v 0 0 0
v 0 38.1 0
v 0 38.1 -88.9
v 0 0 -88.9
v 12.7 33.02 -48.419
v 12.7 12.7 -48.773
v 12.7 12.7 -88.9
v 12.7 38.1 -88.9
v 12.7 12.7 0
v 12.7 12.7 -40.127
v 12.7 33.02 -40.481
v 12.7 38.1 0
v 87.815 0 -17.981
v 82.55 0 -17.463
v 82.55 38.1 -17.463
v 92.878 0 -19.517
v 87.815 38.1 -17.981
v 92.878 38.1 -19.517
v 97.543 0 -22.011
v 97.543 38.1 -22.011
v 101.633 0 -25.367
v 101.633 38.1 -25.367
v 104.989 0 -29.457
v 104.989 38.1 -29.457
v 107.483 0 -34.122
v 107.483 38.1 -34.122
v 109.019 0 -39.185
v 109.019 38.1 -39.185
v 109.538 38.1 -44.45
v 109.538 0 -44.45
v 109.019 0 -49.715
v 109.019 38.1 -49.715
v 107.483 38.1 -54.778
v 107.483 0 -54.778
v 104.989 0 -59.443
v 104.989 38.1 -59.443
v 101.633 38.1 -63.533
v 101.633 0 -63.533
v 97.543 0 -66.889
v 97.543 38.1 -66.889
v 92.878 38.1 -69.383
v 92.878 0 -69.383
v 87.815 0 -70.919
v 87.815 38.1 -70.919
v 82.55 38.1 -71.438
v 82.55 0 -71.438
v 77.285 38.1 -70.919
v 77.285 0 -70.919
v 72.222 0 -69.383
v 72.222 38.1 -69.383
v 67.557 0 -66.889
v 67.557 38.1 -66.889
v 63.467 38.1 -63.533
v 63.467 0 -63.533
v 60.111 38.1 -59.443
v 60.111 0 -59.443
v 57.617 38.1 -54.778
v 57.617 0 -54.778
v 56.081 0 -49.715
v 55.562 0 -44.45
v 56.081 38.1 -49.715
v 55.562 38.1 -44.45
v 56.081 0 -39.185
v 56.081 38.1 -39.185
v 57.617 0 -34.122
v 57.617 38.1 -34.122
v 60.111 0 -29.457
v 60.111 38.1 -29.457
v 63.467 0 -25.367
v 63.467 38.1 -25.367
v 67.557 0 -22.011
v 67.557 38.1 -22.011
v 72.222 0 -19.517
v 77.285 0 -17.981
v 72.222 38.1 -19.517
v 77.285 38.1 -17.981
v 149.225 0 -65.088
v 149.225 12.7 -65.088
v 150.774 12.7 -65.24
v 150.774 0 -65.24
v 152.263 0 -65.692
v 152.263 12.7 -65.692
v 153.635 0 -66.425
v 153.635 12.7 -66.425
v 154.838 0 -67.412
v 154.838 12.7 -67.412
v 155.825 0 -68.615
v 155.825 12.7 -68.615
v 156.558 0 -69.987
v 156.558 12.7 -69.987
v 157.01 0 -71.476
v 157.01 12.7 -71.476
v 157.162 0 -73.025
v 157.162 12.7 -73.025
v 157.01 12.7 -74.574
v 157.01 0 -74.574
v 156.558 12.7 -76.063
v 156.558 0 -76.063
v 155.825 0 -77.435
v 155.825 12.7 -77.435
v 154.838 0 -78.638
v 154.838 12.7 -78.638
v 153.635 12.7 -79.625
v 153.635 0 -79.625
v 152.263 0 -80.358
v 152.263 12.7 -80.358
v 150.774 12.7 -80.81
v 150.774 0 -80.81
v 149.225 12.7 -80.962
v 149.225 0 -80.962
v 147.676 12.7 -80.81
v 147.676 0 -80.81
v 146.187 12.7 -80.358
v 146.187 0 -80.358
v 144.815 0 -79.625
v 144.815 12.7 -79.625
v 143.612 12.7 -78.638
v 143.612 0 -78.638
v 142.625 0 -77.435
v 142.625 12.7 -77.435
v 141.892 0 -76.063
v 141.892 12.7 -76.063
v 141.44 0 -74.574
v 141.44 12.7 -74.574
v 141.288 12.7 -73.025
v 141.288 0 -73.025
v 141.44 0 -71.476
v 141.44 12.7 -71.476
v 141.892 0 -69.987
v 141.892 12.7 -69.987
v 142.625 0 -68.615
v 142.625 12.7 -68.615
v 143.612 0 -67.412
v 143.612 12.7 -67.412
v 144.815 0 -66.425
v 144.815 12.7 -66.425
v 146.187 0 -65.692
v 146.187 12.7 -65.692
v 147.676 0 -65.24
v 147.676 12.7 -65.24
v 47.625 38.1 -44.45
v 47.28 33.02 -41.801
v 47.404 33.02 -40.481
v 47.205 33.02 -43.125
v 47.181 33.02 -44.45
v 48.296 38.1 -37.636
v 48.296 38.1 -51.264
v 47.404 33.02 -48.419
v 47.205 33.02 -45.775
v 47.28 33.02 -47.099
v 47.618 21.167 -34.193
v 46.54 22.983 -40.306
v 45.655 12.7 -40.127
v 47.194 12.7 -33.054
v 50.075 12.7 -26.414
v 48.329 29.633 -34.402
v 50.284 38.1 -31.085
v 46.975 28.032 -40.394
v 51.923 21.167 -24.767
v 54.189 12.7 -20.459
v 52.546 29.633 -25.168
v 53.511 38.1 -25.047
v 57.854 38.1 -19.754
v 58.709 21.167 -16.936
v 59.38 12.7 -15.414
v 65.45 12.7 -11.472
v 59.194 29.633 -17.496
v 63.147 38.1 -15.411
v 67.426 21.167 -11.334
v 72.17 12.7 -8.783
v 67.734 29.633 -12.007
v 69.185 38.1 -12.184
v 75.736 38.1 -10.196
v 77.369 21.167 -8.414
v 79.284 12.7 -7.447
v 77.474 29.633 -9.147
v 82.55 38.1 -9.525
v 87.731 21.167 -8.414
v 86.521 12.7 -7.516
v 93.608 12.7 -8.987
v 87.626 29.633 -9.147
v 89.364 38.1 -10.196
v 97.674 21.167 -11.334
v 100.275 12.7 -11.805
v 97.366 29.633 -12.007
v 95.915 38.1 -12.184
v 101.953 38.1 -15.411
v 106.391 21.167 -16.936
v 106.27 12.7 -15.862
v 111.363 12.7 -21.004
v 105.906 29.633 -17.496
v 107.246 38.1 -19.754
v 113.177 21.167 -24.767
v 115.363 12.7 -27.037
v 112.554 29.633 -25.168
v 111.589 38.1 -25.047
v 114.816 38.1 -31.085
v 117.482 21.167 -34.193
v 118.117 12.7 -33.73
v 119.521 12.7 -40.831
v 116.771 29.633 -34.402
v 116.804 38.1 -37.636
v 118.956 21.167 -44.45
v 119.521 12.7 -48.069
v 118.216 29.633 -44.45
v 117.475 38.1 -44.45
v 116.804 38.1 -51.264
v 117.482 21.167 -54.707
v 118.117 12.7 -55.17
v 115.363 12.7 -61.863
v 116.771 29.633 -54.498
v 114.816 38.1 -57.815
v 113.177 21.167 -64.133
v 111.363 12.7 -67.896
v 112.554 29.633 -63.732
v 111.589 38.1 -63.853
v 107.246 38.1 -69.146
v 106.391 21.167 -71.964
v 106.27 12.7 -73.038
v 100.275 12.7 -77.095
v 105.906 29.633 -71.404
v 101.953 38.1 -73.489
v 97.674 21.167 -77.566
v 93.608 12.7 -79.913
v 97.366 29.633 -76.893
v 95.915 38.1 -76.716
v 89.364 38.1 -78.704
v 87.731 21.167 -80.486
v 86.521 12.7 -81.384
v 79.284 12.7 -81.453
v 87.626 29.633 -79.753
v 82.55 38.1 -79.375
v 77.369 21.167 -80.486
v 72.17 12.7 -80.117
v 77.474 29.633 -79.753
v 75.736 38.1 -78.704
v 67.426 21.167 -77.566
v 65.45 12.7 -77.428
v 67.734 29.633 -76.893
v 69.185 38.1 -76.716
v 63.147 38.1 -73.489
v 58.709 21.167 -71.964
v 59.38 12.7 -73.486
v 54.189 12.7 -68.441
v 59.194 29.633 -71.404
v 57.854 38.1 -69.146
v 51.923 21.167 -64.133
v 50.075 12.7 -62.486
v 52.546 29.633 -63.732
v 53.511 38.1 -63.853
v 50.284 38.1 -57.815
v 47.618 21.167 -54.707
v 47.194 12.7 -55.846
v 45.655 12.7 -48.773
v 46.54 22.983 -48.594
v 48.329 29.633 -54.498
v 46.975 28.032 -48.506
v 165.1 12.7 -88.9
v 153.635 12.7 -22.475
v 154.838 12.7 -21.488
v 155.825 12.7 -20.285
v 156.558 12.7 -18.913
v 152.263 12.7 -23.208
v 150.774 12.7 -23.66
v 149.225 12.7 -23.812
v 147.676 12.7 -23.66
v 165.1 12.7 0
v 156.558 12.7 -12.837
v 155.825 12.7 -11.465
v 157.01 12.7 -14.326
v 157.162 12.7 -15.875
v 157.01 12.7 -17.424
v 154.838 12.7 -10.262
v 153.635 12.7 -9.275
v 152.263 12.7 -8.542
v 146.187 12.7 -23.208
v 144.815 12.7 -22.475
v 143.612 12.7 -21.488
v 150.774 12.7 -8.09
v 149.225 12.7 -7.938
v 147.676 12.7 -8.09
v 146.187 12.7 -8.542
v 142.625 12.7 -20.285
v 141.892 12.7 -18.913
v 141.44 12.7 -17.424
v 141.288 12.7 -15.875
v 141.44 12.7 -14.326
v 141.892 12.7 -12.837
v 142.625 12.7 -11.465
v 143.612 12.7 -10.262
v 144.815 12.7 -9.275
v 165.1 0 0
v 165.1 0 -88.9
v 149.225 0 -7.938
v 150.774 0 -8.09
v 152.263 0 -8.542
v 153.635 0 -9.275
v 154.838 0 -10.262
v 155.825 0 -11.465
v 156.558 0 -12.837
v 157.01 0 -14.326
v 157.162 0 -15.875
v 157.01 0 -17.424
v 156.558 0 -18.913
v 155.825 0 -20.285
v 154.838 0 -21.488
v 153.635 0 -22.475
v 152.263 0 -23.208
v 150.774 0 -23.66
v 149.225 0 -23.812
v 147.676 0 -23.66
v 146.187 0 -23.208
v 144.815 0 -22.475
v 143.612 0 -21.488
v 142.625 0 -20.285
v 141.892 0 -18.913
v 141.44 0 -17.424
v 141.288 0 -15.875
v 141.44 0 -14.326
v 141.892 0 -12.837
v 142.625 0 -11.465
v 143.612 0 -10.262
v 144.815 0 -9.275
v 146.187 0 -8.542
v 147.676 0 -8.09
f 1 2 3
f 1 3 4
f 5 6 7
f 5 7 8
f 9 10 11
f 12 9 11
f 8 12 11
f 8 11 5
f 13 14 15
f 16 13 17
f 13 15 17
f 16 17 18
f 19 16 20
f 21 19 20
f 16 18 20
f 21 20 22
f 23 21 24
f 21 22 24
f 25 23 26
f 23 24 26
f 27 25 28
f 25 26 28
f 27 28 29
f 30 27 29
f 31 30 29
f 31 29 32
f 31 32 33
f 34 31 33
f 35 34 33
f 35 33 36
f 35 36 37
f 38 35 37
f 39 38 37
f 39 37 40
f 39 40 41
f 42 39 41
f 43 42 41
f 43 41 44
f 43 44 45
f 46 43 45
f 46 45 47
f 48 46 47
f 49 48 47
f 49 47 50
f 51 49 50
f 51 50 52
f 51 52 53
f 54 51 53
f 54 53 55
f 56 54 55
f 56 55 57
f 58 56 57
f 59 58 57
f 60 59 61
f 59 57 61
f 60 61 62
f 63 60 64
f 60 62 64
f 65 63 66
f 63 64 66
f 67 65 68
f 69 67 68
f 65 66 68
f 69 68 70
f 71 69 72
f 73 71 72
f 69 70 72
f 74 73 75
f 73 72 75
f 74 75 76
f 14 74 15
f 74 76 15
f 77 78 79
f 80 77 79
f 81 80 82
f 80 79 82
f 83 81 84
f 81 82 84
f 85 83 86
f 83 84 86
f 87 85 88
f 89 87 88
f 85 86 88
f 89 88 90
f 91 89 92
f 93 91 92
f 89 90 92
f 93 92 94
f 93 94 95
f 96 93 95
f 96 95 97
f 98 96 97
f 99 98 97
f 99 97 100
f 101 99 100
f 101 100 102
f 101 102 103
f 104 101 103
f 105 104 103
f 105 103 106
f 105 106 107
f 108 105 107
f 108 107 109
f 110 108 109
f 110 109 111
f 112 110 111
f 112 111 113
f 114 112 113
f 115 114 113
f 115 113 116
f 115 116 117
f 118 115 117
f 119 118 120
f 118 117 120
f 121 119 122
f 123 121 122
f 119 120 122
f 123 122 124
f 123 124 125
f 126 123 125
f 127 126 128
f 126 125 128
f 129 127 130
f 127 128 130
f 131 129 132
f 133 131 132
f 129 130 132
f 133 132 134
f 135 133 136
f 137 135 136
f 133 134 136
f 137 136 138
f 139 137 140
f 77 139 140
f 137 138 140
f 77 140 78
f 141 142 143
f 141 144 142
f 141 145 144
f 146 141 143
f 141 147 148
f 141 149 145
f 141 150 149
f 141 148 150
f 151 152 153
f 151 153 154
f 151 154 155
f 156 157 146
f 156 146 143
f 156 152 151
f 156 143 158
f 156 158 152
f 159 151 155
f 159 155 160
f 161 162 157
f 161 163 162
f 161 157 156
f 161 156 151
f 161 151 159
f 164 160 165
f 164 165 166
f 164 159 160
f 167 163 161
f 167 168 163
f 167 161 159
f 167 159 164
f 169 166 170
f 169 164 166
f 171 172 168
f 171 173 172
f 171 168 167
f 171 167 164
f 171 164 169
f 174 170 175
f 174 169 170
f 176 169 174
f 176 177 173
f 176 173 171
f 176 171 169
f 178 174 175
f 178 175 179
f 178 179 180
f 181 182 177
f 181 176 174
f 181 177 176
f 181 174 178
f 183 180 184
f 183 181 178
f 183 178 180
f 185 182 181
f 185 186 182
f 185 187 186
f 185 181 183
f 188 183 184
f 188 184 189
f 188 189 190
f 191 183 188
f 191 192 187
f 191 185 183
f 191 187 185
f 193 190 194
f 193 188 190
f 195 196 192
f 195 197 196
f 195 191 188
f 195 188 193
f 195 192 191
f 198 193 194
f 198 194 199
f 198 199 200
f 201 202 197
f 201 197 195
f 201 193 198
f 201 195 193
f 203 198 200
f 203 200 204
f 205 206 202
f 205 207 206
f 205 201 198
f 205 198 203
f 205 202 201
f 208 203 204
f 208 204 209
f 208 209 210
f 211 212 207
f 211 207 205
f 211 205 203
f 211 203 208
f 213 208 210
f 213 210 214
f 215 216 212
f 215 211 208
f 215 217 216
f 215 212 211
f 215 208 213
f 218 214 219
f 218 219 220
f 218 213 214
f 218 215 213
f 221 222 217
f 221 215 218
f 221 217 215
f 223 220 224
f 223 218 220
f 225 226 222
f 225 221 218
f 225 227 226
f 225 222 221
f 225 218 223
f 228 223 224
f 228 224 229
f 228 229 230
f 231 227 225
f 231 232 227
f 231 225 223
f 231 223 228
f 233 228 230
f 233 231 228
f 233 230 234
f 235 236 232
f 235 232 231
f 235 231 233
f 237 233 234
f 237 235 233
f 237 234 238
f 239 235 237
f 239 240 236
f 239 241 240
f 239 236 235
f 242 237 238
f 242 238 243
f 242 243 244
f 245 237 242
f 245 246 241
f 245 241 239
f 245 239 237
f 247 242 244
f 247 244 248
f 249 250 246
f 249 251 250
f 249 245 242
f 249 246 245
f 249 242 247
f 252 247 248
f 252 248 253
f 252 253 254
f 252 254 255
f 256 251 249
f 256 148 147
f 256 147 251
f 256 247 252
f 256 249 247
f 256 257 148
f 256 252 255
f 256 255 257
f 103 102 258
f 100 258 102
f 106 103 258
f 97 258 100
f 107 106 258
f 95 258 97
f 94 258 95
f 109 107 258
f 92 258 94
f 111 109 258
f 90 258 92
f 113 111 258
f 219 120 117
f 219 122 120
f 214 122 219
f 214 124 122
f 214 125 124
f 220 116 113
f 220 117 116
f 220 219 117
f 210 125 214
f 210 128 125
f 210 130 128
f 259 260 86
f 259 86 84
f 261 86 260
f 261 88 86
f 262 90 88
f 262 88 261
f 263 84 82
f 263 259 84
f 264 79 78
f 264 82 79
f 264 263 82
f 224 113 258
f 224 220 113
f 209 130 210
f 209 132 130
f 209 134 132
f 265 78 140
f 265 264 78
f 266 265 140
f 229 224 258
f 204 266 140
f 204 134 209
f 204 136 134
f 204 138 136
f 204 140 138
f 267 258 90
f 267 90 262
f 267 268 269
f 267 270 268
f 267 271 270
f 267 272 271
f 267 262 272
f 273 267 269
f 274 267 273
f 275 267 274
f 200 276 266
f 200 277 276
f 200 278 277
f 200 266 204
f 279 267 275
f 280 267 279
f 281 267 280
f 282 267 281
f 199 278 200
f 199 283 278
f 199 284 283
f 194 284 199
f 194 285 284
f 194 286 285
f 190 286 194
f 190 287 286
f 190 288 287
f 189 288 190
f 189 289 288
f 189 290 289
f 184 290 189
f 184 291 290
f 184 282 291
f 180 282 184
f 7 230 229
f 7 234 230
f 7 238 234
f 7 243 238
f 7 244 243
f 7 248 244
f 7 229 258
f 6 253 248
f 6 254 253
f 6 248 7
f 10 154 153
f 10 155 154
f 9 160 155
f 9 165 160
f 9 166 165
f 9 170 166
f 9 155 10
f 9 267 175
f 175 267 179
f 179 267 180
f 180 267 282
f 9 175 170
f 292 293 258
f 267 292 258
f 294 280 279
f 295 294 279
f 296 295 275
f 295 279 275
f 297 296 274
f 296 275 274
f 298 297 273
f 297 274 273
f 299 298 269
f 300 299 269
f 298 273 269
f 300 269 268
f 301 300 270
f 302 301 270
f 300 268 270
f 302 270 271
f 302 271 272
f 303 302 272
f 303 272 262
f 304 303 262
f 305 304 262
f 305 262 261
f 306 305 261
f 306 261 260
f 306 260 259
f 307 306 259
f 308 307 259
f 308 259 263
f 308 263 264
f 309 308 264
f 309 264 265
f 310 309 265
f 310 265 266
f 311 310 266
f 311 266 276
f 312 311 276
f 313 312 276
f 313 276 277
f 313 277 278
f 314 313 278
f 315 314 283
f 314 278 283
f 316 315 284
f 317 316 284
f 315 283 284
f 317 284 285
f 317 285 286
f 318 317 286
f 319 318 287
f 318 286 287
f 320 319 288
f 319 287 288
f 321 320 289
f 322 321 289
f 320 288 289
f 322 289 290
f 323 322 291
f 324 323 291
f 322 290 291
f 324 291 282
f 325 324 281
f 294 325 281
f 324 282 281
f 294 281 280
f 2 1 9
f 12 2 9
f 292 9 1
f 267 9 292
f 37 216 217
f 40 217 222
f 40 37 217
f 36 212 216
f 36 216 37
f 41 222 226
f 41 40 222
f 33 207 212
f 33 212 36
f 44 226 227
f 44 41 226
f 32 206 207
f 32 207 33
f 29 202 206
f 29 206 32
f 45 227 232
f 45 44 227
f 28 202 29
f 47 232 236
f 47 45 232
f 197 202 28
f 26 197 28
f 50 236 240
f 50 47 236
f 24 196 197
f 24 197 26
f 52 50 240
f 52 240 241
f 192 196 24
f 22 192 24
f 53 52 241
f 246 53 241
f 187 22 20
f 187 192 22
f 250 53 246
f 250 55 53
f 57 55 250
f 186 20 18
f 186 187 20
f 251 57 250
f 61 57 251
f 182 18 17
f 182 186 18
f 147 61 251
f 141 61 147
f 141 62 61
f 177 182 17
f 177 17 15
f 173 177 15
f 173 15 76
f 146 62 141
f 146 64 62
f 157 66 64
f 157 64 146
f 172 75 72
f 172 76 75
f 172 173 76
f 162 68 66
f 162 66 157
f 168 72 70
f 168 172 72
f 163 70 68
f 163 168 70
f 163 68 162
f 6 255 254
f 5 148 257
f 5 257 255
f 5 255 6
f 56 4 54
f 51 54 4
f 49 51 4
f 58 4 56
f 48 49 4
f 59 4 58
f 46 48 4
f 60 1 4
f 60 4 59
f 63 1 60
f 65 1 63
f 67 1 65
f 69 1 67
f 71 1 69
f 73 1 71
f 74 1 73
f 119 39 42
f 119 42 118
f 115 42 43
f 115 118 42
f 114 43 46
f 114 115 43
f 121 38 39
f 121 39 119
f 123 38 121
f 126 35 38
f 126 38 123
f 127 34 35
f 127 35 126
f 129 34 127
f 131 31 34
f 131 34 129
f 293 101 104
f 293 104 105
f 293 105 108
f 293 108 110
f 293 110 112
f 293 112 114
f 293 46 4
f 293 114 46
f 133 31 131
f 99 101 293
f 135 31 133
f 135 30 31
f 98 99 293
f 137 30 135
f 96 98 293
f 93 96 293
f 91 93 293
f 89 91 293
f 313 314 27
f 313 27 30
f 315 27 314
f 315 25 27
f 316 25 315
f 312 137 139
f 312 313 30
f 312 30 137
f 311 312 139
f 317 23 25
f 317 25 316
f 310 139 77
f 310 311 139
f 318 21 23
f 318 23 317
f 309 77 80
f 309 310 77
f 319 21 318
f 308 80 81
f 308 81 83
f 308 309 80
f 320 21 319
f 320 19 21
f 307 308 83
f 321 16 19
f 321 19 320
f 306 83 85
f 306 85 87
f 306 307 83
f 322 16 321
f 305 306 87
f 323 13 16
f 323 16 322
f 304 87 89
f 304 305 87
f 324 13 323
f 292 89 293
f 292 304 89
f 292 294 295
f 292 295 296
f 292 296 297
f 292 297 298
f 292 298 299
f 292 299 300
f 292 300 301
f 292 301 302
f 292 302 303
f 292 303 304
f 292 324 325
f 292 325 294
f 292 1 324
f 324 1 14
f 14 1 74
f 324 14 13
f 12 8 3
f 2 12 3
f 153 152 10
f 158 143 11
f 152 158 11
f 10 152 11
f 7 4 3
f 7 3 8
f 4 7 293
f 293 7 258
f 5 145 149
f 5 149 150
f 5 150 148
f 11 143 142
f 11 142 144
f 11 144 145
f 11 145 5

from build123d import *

# Parameters (mm, degrees)
BASE_EXTRUDE_THIN_DEPTH = 88.9
BOSS_EXTRUDE1_REACH     = 193.345
SKETCH2_R               = 34.925
BOSS_EXTRUDE1_DRAFT     = 5
SKETCH3_R               = 26.9875
CUT_EXTRUDE1_DEPTH      = 192.344793501
SKETCH4_R               = 7.9375
CUT_EXTRUDE2_DEPTH      = 190.225738207
RIB1_REACH              = 192.398
SKETCH5_WALLS_W         = 403.925170957
SKETCH5_WALLS_H         = 7.9375
RIB1_DRAFT_ANGLE        = 1


with BuildPart() as part:
    # Sketch1 → Base-Extrude-Thin (new body)
    with BuildSketch(Plane.XY):
        Polygon((0, 38.1), (0, 0), (165.1, 0), (165.1, 12.7), (12.7, 12.7), (12.7, 38.1), align=None)
    extrude(amount=-BASE_EXTRUDE_THIN_DEPTH)




with BuildPart() as boss_extrude1_long_prism_1:
    # Sketch2 → Boss-Extrude1 (the long prism of profile 1, to be tilted and cut off)
    with BuildSketch(Plane(origin=(0, 38.1, 0), x_dir=(-1, 0, 0), z_dir=(0, 1, 0))):
        with Locations((-82.55, -44.45)):
            Circle(SKETCH2_R)
    extrude(amount=-BOSS_EXTRUDE1_REACH)
    boss_extrude1_tool1_sides = [boss_extrude1_long_prism_1.faces().sort_by_distance(p)[0] for p in [
        (117.475, -58.5725, -44.45),
    ]]
    draft(boss_extrude1_tool1_sides, Plane(origin=(0, 38.1, 0), x_dir=(-1, 0, 0), z_dir=(0, 1, 0)), BOSS_EXTRUDE1_DRAFT)  # the draft: side faces tilted about the start plane


with BuildPart() as part_1:
    add(part.part)
    boss_extrude1_tool1 = boss_extrude1_long_prism_1.part - part.part
    add(boss_extrude1_tool1.solids().sort_by_distance((82.55, 38.1, -44.45))[0])

    # Sketch3 → Cut-Extrude1 (cut, through all)
    with BuildSketch(Plane(origin=(0, 38.1, 0), x_dir=(-1, 0, 0), z_dir=(0, 1, 0))):
        with Locations(Location((-82.55, -44.45, 0), (0, 0, 90))):
            Circle(SKETCH3_R)
    extrude(amount=-CUT_EXTRUDE1_DEPTH, mode=Mode.SUBTRACT)

    # Sketch4 → Cut-Extrude2 (cut, through all)
    with BuildSketch(Plane(origin=(0, 12.7, 0), x_dir=(-1, 0, 0), z_dir=(0, 1, 0))):
        with Locations(Location((-149.225, -15.875, 0), (0, 0, 90))):
            Circle(SKETCH4_R)
        with Locations(Location((-149.225, -73.025, 0), (0, 0, 90))):
            Circle(SKETCH4_R)
    extrude(amount=-CUT_EXTRUDE2_DEPTH, mode=Mode.SUBTRACT)

    # Sketch5 walls → Rib1 (add, up to next)
    with BuildSketch(Plane(origin=(0, 33.02, 0), x_dir=(-1, 0, 0), z_dir=(0, 1, 0)), mode=Mode.PRIVATE) as rib1_sk1:
        with Locations((-32.214634147, -44.45)):
            Rectangle(SKETCH5_WALLS_W, SKETCH5_WALLS_H)
    rib1_tool1 = extrude(rib1_sk1.sketch, amount=-RIB1_REACH, mode=Mode.PRIVATE) - part_1.part
    add(rib1_tool1.solids().sort_by_distance((32.214634146, 33.02, -44.45))[0])

    # Rib1 draft
    rib1_draft_faces = [part_1.faces().sort_by_distance(p)[0] for p in [
        (32.214634147, 32.52, -48.41875),
        (32.214634147, 32.52, -40.48125),
    ]]
    draft(rib1_draft_faces, Plane(origin=(32.214634146, 33.02, -44.45), x_dir=(-1, 0, 0), z_dir=(0, 1, 0)), RIB1_DRAFT_ANGLE)


solid = part_1.part
